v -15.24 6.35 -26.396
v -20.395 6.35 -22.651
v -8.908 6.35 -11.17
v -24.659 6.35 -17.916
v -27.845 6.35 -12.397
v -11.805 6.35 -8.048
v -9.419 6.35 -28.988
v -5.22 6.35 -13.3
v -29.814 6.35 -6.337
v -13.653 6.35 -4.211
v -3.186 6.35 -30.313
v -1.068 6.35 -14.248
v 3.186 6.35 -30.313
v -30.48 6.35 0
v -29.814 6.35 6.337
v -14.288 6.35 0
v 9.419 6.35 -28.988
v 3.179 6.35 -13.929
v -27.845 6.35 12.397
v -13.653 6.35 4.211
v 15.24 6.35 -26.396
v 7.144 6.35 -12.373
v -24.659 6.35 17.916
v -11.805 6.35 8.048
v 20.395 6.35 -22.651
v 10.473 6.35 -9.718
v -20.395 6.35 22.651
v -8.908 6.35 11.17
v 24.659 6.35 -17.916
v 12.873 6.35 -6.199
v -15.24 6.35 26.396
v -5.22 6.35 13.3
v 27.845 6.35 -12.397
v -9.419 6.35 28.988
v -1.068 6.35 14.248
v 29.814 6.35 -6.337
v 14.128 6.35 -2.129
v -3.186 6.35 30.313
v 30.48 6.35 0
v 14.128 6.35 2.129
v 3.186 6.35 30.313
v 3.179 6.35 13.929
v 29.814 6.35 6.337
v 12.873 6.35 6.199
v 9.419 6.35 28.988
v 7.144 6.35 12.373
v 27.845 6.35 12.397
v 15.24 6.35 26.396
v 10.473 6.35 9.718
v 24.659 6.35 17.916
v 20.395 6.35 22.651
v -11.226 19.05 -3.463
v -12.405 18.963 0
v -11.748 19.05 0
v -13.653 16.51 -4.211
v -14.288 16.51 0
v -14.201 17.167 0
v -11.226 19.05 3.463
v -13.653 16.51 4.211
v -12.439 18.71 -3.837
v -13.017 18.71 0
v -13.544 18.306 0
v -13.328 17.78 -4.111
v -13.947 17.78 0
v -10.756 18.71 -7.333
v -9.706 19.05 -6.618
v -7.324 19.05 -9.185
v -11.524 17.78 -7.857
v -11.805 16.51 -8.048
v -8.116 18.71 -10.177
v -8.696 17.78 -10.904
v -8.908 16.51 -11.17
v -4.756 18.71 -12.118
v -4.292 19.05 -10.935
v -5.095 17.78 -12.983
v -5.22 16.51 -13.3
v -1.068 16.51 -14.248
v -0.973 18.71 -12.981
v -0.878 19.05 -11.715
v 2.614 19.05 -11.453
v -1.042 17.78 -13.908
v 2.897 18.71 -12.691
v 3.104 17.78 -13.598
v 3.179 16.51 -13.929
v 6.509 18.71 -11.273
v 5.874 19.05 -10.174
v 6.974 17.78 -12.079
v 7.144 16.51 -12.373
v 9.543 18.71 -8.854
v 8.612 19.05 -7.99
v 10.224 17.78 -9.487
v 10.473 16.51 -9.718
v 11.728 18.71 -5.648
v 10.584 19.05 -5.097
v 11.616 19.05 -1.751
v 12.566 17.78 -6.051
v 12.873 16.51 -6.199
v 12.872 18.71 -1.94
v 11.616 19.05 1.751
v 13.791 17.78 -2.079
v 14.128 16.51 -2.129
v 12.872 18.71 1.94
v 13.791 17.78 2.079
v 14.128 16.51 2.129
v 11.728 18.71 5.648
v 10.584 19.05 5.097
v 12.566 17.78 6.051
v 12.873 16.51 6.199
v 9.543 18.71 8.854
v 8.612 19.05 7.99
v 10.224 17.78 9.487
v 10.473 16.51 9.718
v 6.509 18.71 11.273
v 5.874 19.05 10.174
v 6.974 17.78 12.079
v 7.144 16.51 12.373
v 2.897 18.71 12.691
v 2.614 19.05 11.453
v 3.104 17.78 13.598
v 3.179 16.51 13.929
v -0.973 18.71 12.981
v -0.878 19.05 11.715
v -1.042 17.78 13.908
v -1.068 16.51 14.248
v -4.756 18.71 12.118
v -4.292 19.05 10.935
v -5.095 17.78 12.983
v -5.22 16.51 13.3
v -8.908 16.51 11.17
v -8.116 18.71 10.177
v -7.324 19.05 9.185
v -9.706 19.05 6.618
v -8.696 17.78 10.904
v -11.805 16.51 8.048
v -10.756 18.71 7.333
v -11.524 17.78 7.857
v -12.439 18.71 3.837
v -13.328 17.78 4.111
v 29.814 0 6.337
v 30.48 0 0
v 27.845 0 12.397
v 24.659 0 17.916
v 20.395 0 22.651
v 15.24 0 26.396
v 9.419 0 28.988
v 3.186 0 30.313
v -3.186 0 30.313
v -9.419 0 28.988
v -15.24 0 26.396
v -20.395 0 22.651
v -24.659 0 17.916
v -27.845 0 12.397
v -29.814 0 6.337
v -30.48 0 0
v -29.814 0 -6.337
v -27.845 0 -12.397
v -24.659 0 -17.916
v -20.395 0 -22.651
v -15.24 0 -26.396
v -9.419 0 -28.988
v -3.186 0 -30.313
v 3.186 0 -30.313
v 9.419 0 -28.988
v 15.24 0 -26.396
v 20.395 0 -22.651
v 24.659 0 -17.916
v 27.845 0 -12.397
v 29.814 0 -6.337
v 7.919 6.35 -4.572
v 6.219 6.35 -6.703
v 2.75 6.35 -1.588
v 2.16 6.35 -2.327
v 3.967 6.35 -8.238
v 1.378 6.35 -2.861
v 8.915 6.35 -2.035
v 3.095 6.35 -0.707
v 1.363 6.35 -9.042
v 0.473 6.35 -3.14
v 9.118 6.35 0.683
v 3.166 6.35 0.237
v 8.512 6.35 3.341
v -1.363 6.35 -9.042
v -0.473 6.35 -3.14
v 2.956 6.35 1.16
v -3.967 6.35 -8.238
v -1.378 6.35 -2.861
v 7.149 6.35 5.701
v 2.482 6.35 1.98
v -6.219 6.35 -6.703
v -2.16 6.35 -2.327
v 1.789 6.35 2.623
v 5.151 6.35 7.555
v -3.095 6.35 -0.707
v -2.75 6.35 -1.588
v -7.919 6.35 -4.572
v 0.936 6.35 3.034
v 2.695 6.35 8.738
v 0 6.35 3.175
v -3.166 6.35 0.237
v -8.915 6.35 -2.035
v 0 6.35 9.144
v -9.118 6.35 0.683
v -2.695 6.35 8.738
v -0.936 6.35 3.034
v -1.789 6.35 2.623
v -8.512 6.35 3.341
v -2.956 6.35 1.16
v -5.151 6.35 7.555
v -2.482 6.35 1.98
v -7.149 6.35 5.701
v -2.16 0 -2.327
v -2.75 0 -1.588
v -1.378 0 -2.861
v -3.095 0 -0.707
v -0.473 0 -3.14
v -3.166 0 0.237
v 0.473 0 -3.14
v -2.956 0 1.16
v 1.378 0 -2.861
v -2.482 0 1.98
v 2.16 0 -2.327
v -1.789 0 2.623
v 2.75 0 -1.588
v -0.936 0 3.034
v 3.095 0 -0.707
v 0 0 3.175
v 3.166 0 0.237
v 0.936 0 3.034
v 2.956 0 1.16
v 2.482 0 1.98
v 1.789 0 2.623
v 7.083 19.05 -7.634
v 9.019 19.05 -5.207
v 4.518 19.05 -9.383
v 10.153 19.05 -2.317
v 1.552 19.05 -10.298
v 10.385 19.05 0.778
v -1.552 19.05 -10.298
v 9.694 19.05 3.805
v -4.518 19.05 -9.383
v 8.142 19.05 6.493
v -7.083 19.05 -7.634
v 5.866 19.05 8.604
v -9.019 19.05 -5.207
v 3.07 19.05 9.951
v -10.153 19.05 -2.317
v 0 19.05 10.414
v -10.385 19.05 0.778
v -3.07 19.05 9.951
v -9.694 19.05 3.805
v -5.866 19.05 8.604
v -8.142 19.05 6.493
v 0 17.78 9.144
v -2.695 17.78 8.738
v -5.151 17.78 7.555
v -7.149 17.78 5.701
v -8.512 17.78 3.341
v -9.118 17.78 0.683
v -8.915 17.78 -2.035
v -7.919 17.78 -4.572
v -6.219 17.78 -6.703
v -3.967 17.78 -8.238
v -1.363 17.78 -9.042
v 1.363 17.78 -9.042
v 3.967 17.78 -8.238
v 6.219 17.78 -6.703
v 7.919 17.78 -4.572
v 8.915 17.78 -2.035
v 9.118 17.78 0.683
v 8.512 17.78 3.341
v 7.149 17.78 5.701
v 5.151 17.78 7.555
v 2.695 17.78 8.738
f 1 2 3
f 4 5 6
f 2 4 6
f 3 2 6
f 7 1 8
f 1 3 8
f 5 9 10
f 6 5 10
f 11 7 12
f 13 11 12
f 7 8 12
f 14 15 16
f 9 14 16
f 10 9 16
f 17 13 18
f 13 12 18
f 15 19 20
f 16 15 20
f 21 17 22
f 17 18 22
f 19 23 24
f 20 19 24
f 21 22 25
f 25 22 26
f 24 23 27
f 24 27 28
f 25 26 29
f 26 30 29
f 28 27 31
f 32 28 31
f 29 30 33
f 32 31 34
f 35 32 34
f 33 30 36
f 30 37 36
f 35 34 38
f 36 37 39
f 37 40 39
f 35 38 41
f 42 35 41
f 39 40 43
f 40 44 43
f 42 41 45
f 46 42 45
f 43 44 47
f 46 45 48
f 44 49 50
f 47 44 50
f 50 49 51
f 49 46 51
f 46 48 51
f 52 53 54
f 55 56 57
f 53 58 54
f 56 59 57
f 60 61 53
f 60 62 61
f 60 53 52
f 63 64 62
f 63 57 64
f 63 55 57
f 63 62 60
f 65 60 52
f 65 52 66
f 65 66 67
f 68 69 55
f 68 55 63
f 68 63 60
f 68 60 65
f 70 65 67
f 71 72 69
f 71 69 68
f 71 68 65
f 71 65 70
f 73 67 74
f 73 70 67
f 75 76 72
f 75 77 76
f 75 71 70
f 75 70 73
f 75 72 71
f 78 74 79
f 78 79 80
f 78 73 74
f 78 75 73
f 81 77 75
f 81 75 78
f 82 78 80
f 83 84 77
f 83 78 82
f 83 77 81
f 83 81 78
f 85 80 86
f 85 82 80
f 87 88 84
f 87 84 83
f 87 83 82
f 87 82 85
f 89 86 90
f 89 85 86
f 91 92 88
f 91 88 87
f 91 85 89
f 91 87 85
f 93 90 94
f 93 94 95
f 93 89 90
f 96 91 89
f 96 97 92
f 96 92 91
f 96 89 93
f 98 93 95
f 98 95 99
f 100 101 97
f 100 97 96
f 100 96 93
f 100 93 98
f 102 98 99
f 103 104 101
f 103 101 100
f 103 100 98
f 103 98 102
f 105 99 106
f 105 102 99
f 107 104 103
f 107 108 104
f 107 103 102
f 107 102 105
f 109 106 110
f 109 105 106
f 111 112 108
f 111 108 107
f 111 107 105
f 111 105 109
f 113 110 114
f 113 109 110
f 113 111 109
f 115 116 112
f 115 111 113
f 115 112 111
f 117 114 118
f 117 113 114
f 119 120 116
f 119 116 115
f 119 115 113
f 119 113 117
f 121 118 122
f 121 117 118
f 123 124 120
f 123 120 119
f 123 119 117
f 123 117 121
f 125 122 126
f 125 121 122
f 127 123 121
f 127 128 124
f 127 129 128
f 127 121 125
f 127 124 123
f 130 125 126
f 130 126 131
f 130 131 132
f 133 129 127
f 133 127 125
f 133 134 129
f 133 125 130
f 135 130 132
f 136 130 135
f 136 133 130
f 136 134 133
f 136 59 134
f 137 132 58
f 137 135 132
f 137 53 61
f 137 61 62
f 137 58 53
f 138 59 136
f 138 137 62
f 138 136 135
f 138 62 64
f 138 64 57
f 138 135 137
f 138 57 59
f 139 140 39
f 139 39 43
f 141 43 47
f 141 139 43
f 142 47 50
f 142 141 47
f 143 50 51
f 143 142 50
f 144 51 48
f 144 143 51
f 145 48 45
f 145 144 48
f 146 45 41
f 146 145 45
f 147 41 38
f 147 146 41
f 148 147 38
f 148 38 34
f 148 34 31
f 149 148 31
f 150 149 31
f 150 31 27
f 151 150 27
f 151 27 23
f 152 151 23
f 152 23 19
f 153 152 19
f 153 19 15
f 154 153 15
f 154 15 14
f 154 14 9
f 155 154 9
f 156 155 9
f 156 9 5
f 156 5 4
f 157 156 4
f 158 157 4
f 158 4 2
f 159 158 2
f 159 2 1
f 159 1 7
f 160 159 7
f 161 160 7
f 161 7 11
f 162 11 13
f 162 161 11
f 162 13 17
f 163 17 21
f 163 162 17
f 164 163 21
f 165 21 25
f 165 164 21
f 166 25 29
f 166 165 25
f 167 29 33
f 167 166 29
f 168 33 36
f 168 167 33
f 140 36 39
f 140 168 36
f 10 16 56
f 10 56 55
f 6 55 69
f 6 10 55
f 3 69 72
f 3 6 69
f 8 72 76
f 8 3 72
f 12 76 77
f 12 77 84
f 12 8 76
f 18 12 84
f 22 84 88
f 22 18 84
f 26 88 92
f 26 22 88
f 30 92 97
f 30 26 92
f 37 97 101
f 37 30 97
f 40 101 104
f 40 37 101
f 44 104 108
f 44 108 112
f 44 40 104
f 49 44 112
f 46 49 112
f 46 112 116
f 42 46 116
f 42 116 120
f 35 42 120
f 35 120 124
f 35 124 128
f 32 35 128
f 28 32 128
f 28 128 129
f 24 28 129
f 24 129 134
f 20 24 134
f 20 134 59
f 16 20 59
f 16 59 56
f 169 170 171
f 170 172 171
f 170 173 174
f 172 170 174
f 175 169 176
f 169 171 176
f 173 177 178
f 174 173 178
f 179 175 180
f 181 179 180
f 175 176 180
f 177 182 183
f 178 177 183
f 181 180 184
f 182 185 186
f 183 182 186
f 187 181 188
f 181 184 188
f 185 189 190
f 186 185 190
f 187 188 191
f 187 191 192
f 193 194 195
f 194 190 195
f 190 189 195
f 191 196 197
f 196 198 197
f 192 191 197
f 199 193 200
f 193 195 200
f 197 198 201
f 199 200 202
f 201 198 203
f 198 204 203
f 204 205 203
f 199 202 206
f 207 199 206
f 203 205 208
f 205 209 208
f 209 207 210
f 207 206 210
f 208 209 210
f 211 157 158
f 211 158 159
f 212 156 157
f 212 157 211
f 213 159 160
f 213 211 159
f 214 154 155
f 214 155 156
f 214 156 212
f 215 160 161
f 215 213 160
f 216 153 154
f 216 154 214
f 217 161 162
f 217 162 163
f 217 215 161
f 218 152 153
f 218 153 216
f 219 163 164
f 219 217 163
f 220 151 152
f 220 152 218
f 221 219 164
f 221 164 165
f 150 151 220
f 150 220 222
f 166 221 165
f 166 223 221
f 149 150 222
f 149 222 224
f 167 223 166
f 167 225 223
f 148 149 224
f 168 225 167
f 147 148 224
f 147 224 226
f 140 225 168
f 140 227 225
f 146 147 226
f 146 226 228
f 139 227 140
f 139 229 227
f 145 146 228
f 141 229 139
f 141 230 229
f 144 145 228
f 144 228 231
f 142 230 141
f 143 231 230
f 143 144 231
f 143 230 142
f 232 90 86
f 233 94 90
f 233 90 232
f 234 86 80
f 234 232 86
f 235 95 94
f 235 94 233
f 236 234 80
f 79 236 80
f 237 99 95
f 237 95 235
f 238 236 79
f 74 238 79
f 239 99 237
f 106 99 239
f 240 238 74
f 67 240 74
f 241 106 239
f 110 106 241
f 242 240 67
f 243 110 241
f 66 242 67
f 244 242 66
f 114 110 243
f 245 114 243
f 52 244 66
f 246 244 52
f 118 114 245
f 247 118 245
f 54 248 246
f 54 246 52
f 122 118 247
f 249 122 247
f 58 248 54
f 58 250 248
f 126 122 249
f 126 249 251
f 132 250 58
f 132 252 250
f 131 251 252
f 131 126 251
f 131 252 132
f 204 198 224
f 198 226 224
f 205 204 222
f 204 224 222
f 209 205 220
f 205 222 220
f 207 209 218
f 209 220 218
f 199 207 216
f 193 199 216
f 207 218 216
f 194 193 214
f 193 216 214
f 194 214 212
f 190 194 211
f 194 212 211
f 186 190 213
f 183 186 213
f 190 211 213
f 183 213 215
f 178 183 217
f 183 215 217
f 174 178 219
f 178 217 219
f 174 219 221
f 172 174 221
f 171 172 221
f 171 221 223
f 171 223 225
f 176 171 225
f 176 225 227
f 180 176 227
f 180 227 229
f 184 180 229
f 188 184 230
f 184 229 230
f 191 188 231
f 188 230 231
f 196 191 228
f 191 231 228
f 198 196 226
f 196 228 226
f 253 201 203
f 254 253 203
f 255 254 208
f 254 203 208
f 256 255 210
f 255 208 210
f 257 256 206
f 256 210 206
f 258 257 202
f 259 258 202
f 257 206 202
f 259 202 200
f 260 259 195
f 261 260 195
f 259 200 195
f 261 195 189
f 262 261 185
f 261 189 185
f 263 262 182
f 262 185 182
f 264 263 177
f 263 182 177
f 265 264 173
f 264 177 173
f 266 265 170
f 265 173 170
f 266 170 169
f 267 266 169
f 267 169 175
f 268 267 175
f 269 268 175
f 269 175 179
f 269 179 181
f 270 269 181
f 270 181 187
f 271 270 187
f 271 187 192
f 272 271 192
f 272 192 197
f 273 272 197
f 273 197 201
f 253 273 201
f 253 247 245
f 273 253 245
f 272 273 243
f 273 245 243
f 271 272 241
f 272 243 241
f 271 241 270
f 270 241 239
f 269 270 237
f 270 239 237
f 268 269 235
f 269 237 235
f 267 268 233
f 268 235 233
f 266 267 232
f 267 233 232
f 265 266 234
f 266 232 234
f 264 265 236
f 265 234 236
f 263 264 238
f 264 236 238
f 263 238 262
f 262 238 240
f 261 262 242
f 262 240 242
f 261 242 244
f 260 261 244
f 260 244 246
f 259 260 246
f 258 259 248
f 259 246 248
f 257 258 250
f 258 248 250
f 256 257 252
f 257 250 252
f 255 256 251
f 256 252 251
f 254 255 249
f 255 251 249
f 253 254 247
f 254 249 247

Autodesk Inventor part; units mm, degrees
ref_plane "YZ Plane" through (0, 0, 0) normal (1, 0, 0) x (0, 1, 0)
ref_plane "XZ Plane" through (0, 0, 0) normal (0, 1, 0) x (-1, 0, 0)
ref_plane "XY Plane" through (0, 0, 0) normal (0, 0, 1) x (1, 0, 0)
sketch "Sketch1" plane through (0, 0, 0) normal (0, 1, 0) x (-1, 0, 0)
  line L0 (0, -20.0025) -> (0, 20.0025) projected
  line L1 (-20.0025, 0) -> (20.0025, 0) projected
  circle A0 centre (0, 0) radius 14.2875
  dimension "d0" = 28.575
extrude "Extrusion1" add sketch "Sketch1" along normal blind 19.05
sketch "Sketch2" plane through (0, 19.05, 0) normal (0, 1, 0) x (1, 0, 0)
  line L0 (0, 20.0025) -> (0, -20.0025) projected
  line L1 (20.0025, 0) -> (-20.0025, 0) projected
  point P0 (0, 0)
sketch "Sketch3" plane through (0, 19.05, 0) normal (0, 1, 0) x (1, 0, 0)
  point P0 (0, 0)
hole "Hole1" at (0, 19.05, 0) direction (0, -1, 0) diameter 6.35 end through all counterbore diameter 18.288 counterbore depth 12.7
chamfer "Chamfer1" distance 1.27 angle 45 1 edges at (0, 19.05, -9.144)
fillet "Fillet1" radius 2.54 1 edges at (14.2875, 19.05, 0)
sketch "Sketch4" plane through (0, 0, 0) normal (0, -1, 0) x (1, 0, 0)
  circle A0 centre (0, 0) radius 14.2875 projected
  circle A1 centre (0, 0) radius 30.48
  dimension "d14" = 60.96
extrude "Extrusion2" add sketch "Sketch4" against normal blind 6.35
properties material "ABS, BEIGE"
